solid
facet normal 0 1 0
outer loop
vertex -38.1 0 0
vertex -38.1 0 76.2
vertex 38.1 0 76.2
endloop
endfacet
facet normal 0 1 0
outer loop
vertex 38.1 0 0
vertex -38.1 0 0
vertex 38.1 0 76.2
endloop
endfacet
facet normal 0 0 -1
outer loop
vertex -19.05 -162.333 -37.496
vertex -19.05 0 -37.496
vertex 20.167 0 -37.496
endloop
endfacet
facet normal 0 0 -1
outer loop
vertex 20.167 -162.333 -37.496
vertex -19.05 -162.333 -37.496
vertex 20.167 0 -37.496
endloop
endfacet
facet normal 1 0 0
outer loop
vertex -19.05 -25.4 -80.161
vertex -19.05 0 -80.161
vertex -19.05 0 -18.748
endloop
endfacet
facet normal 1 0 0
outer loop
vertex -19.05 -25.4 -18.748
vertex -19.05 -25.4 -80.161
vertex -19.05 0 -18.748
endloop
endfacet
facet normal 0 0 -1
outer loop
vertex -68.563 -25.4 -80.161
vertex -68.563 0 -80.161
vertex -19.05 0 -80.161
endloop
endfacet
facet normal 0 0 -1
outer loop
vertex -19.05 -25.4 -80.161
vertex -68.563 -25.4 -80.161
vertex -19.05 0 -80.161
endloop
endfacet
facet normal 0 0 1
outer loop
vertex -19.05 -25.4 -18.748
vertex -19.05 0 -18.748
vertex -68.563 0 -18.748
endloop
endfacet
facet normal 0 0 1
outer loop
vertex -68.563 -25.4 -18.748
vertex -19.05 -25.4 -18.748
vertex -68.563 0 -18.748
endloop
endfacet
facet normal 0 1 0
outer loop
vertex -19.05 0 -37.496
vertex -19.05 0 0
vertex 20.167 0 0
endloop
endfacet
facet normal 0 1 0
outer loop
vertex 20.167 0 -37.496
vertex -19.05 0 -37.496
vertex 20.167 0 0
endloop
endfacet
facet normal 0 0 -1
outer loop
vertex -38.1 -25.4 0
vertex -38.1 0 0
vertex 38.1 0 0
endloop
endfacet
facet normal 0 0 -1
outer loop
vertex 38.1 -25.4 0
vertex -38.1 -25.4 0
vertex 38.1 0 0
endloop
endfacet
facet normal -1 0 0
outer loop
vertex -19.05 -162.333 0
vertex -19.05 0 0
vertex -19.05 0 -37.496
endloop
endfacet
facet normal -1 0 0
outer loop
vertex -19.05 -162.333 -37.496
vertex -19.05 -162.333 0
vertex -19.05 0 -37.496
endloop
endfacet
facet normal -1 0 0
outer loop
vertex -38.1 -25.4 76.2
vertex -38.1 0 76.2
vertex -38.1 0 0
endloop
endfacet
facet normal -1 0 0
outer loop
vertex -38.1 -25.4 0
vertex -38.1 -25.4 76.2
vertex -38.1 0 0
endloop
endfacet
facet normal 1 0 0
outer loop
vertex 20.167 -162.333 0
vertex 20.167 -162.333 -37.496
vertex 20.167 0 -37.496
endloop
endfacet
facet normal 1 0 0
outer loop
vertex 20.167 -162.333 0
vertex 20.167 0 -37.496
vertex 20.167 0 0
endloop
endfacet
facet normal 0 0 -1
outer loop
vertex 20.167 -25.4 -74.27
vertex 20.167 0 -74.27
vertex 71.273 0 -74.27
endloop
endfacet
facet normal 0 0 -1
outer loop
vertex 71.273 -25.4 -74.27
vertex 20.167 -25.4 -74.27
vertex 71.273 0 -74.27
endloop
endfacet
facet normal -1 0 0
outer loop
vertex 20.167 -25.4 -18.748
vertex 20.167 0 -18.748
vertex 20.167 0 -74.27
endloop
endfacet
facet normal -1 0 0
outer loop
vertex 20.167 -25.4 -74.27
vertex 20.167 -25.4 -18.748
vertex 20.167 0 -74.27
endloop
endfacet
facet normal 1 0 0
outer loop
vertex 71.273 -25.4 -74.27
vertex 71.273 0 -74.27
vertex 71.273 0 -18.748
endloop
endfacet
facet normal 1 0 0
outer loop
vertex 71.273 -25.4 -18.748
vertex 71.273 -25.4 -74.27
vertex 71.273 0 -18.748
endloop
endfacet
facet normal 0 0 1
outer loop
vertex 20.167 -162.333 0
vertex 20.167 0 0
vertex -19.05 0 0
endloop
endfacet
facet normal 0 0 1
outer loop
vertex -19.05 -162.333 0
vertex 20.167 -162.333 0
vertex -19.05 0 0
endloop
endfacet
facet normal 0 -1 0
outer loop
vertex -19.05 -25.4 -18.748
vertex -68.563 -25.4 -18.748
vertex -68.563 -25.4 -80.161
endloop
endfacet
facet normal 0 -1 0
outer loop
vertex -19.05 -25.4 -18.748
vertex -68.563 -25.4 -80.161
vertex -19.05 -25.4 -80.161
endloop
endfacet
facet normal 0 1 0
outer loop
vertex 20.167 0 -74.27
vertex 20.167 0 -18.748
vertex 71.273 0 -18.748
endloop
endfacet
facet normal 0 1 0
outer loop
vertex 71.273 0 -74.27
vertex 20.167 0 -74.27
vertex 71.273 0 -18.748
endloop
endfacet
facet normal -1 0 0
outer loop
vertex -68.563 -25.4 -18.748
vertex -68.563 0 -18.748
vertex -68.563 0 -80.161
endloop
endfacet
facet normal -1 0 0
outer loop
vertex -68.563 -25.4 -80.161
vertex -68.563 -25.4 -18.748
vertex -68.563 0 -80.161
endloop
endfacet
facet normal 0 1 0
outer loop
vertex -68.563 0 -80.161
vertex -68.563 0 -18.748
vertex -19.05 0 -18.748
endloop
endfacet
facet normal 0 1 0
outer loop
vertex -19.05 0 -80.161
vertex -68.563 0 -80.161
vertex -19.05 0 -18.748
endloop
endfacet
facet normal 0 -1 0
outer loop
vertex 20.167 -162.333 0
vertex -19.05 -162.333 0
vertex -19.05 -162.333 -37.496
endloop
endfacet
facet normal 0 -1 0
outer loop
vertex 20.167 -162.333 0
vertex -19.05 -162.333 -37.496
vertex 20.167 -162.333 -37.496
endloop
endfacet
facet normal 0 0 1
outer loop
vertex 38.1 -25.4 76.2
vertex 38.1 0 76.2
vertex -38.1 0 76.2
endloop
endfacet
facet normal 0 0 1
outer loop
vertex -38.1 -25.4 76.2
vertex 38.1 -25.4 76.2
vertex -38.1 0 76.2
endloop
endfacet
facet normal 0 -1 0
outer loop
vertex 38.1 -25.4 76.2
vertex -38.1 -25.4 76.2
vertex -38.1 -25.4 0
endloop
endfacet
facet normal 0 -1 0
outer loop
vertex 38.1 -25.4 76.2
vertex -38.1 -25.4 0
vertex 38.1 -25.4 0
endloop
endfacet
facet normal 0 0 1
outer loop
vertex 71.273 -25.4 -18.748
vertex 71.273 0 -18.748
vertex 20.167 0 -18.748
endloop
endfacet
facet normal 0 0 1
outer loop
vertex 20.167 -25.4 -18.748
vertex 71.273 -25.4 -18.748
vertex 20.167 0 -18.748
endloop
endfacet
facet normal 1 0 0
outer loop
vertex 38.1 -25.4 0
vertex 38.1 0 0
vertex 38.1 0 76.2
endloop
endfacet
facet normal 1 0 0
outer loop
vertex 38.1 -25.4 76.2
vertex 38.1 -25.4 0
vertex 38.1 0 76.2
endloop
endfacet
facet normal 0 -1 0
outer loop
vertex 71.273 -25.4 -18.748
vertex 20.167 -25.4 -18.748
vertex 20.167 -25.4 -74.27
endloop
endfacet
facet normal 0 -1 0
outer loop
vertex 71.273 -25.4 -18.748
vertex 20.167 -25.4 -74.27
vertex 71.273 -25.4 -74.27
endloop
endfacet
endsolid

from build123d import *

# Parameters (mm, degrees)
F1_DEPTH = 25.4
F2_DEPTH = 162.33295


with BuildPart() as f1:
    # F0 (on Front) → F1 (new body)
    with BuildSketch(Plane.XZ):
        Polygon((-19.05, 0), (0, 0), (0, 76.2), (-38.1, 76.2), (-38.1, 0), align=None)
        Polygon((0, 76.2), (0, 0), (20.167289, 0), (38.1, 0), (38.1, 76.2), align=None)
        Polygon((-19.05, -37.496105), (-19.05, -18.748052), (-68.562508, -18.748052), (-68.562508, -80.16061), (-19.05, -80.16061), align=None)
        Polygon((71.273305, -18.748052), (20.167289, -18.748052), (20.167289, -37.496105), (20.167289, -74.269518), (71.273305, -74.269518), align=None)
    extrude(amount=F1_DEPTH)


with BuildPart() as f2:
    # F0 (on Front) → F2 (new body)
    with BuildSketch(Plane.XZ):
        Polygon((20.167289, 0), (0, 0), (-19.05, 0), (-19.05, -18.748052), (-19.05, -37.496105), (20.167289, -37.496105), (20.167289, -18.748052), align=None)
    extrude(amount=F2_DEPTH)


solid = Compound([f1.part, f2.part])
